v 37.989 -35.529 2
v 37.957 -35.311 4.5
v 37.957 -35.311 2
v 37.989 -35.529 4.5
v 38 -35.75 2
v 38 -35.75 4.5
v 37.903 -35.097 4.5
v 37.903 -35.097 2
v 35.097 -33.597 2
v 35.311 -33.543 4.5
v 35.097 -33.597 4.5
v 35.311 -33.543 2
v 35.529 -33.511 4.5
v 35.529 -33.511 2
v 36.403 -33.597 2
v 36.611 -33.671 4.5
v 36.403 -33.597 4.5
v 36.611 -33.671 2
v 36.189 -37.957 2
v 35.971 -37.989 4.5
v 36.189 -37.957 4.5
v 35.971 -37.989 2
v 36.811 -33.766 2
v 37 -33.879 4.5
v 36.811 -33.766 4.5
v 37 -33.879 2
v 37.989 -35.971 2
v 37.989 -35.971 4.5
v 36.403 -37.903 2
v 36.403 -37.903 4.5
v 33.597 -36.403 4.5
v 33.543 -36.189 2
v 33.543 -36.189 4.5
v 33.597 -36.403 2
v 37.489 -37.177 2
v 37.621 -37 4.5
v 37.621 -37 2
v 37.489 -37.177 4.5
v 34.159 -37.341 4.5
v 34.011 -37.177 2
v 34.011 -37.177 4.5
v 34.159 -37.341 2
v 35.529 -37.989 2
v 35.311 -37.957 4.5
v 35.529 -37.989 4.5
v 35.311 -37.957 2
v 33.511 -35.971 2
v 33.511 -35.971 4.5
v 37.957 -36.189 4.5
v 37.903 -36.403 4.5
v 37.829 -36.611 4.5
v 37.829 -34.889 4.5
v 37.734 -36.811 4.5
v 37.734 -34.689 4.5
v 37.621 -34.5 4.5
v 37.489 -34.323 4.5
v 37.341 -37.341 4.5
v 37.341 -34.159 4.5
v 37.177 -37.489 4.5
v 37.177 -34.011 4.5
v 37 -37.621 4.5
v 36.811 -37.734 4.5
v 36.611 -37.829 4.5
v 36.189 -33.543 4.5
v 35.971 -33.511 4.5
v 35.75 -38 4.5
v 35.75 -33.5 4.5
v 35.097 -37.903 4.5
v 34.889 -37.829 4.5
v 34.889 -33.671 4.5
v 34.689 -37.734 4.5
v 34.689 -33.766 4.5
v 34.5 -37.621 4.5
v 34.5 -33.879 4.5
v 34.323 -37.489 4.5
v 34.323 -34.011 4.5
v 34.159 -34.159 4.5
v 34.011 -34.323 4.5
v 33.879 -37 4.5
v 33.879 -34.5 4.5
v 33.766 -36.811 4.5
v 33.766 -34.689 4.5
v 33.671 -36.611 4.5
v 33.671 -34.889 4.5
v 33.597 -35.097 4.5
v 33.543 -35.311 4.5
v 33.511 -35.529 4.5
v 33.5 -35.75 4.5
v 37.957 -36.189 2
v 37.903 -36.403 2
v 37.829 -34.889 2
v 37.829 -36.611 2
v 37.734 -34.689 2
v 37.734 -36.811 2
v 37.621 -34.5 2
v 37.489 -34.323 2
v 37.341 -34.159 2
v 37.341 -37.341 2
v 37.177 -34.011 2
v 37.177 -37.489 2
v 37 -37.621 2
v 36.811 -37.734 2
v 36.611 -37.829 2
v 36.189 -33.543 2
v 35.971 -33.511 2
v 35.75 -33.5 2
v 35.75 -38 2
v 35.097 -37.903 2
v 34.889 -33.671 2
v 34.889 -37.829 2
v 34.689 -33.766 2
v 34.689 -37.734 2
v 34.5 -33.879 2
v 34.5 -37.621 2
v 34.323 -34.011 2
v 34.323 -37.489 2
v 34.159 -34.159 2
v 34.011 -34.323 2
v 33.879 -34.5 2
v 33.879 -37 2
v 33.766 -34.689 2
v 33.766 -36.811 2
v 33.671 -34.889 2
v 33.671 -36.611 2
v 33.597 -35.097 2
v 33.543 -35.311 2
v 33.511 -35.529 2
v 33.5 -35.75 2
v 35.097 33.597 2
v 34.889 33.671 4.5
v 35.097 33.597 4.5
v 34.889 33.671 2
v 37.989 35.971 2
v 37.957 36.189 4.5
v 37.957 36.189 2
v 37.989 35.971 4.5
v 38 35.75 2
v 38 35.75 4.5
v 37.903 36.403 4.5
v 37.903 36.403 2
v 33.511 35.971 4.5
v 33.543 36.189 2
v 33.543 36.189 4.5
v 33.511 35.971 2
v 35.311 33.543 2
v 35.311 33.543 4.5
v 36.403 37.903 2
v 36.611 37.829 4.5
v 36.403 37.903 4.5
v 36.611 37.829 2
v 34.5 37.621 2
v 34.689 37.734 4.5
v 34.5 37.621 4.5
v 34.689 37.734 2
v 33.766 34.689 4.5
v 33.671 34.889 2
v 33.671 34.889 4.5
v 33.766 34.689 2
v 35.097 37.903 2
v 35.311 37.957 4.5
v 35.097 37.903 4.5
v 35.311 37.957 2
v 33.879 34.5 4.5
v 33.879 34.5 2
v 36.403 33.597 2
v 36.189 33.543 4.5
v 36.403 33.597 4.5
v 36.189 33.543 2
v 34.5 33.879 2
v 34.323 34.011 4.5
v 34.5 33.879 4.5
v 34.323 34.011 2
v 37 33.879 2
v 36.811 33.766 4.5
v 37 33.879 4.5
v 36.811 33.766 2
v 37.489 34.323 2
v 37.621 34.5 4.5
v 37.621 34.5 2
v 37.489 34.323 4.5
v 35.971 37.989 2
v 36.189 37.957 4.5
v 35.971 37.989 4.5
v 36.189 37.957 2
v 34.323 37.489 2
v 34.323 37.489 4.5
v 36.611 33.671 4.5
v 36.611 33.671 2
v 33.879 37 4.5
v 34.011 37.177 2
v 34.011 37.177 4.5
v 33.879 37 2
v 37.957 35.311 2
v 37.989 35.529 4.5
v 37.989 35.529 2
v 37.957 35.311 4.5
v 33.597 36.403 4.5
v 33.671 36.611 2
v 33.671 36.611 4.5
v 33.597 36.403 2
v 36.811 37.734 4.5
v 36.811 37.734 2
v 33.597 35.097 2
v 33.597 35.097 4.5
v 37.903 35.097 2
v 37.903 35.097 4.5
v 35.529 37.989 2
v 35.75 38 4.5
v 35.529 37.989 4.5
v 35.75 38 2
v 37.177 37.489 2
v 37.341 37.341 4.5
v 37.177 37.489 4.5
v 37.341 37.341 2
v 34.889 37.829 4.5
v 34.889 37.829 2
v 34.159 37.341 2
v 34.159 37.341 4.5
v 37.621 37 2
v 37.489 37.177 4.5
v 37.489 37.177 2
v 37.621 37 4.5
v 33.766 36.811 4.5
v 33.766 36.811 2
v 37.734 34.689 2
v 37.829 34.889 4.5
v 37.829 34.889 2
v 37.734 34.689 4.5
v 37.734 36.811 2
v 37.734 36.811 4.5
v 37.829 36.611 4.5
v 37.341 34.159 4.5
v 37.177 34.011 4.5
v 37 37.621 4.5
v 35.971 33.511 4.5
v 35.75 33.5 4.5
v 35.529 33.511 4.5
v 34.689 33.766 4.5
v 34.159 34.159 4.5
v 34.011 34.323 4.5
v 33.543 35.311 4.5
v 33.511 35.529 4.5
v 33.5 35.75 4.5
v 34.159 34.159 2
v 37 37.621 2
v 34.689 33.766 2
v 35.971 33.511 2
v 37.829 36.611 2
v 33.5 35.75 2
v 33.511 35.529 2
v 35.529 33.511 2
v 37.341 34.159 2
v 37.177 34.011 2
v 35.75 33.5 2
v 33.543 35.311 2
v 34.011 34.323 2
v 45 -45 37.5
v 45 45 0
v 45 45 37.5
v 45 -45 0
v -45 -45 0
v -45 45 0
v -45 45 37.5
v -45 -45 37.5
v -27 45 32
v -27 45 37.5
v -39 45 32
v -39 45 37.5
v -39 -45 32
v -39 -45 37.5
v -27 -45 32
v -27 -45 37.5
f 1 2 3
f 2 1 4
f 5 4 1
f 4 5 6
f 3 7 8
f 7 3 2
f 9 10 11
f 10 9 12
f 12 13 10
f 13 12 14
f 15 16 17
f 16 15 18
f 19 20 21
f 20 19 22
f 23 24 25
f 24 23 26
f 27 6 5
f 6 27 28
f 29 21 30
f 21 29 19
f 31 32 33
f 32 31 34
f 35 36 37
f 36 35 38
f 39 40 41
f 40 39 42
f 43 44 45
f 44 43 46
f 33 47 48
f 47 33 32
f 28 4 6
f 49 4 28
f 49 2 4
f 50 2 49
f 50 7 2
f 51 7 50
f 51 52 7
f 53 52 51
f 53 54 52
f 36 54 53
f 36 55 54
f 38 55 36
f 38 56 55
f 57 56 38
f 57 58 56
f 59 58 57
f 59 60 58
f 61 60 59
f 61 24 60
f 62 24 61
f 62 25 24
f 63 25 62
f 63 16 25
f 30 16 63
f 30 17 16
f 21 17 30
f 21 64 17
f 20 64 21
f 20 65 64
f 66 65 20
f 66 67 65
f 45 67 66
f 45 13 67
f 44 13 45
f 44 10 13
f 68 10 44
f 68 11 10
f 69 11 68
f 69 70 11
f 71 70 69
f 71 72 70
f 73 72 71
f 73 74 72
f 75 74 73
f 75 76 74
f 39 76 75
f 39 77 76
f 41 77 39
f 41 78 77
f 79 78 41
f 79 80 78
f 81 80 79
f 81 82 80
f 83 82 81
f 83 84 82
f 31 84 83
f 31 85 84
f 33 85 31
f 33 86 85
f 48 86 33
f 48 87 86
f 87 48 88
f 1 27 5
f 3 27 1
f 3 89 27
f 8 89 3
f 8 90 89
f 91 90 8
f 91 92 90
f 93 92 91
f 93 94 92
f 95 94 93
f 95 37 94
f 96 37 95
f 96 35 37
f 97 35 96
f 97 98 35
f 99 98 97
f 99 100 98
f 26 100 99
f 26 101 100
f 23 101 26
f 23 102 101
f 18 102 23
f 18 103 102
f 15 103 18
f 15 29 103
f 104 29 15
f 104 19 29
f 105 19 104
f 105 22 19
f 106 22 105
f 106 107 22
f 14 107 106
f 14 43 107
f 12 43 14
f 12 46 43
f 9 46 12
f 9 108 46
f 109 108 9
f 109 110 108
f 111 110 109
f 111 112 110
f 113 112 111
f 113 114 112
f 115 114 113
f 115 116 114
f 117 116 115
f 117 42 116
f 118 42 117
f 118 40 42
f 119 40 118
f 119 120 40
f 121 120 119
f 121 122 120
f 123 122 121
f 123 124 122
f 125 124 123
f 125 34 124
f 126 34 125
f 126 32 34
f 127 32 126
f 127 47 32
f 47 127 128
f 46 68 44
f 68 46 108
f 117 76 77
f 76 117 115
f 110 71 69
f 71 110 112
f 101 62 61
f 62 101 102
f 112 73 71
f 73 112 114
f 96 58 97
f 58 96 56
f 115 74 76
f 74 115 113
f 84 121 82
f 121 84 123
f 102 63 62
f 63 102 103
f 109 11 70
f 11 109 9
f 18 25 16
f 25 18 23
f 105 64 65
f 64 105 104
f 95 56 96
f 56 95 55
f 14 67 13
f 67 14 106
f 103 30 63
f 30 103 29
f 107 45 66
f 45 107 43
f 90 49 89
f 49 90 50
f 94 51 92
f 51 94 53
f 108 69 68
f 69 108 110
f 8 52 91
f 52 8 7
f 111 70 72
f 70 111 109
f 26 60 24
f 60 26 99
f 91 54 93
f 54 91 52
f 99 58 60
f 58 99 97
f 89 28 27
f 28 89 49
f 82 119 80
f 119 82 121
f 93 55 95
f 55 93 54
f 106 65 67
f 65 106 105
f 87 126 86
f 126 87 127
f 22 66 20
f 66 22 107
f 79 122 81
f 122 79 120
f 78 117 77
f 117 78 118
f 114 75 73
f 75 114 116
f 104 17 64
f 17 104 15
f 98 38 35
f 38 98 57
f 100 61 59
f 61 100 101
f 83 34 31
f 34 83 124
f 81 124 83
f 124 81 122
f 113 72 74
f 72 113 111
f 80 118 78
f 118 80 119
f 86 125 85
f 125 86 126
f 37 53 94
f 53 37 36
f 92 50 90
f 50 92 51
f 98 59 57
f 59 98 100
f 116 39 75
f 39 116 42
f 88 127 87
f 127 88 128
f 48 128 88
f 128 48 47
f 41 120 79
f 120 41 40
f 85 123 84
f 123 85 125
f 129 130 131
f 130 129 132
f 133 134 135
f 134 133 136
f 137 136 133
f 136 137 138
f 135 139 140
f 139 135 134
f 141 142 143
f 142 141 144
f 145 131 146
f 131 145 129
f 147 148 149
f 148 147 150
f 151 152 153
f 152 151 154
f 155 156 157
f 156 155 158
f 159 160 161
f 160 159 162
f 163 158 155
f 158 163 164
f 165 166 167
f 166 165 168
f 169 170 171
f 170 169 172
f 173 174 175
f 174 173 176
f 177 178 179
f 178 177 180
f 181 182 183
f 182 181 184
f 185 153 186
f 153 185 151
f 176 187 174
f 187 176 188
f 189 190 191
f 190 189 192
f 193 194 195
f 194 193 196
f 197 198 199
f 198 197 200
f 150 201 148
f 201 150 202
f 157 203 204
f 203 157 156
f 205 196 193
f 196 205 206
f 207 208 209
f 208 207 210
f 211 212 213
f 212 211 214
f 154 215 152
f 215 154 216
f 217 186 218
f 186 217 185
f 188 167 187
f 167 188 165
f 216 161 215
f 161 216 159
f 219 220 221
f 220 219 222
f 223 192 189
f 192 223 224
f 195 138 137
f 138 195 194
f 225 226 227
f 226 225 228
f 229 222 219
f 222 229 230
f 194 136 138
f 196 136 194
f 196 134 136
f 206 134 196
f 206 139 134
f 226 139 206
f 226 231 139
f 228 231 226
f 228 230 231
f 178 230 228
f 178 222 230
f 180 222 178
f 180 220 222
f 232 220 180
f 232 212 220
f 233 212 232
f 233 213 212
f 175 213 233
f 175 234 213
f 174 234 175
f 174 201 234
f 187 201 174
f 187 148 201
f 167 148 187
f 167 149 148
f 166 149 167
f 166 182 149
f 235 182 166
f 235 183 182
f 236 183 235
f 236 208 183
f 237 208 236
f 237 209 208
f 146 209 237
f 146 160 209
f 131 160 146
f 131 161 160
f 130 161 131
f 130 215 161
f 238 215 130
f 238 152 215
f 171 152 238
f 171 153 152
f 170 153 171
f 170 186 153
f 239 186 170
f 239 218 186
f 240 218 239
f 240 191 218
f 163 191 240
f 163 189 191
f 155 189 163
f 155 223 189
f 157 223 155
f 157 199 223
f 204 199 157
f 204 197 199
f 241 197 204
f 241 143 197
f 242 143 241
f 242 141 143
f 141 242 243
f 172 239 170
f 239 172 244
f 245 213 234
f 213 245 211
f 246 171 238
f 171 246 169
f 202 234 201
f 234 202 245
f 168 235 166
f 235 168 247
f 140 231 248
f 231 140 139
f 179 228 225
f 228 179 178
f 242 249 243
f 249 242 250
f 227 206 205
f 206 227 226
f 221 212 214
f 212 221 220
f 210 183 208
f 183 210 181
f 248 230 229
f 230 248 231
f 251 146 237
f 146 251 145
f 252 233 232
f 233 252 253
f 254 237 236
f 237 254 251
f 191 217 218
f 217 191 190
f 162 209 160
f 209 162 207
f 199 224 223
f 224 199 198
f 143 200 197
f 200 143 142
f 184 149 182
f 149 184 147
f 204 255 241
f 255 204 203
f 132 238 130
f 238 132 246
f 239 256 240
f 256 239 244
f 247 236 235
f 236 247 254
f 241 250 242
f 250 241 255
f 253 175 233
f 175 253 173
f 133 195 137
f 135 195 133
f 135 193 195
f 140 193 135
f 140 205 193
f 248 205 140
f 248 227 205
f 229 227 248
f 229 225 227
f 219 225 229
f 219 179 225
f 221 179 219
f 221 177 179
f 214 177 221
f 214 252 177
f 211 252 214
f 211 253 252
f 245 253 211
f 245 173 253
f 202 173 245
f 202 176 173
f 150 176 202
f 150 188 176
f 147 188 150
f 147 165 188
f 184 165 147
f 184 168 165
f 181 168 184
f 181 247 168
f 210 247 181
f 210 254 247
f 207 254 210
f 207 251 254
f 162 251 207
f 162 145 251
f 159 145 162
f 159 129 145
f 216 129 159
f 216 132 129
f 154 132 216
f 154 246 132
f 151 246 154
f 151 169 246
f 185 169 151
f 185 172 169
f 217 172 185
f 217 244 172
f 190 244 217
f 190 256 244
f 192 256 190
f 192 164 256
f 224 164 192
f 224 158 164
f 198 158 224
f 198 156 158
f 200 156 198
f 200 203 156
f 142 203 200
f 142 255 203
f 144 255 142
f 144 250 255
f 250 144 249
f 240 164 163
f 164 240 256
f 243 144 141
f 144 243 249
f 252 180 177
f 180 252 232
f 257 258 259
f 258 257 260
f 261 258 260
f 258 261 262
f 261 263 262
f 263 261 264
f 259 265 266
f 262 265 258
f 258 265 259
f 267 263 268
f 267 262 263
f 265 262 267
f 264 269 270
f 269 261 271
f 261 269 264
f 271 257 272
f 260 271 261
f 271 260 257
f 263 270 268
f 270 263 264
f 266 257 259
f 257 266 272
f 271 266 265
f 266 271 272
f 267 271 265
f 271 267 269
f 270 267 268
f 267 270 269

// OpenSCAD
// DIY magnetic stirrer housing - upside-down open box over PC fan
// Print orientation: top plate on bed (z = 0), walls rise to open top (z = 40)

// ---------- Parameters ----------
plate_t      = 2;     // top plate thickness
wall_t       = 2.5;   // wall thickness
box_h        = 40;    // total height (open top at z = 40)
outer_x      = 90;    // outer size in X
outer_y      = 90;    // outer size in Y
screw_d      = 4.5;   // M4 screw hole diameter
screw_n      = 4;     // number of screw holes
screw_pitch  = 71.5;  // square pattern pitch (centre to centre)
notch_w      = 12;    // cable notch width
notch_d      = 8;     // cable notch depth from open edge
eps          = 0.5;   // cutter overshoot past faces

$fn = 64;

// ---------- Model ----------
difference() {
    // Outer block
    translate([-outer_x/2, -outer_y/2, 0])
        cube([outer_x, outer_y, box_h]);

    // Open top: cut down to z = box_h - wall_t, leaving a rim
    translate([-outer_x/2 - eps, -outer_y/2 - eps, box_h - wall_t])
        cube([outer_x + 2*eps, outer_y + 2*eps, wall_t + eps]);

    // Screw holes through top plate, centred on plate
    for (i = [0 : screw_n - 1]) {
        a = (i < 2) ? 0 : 90;   // two rows along Y
        translate([screw_pitch/2, a ? screw_pitch/2 : -screw_pitch/2, plate_t])
            cylinder(d = screw_d, h = plate_t + eps, $fn = 64);
    }

    // Cable notch in one wall, centred along the wall
    translate([-outer_x/2 + notch_w/2, -outer_y/2 - eps, box_h - notch_d])
        cube([notch_w, outer_y + 2*eps, notch_d + eps]);
}
